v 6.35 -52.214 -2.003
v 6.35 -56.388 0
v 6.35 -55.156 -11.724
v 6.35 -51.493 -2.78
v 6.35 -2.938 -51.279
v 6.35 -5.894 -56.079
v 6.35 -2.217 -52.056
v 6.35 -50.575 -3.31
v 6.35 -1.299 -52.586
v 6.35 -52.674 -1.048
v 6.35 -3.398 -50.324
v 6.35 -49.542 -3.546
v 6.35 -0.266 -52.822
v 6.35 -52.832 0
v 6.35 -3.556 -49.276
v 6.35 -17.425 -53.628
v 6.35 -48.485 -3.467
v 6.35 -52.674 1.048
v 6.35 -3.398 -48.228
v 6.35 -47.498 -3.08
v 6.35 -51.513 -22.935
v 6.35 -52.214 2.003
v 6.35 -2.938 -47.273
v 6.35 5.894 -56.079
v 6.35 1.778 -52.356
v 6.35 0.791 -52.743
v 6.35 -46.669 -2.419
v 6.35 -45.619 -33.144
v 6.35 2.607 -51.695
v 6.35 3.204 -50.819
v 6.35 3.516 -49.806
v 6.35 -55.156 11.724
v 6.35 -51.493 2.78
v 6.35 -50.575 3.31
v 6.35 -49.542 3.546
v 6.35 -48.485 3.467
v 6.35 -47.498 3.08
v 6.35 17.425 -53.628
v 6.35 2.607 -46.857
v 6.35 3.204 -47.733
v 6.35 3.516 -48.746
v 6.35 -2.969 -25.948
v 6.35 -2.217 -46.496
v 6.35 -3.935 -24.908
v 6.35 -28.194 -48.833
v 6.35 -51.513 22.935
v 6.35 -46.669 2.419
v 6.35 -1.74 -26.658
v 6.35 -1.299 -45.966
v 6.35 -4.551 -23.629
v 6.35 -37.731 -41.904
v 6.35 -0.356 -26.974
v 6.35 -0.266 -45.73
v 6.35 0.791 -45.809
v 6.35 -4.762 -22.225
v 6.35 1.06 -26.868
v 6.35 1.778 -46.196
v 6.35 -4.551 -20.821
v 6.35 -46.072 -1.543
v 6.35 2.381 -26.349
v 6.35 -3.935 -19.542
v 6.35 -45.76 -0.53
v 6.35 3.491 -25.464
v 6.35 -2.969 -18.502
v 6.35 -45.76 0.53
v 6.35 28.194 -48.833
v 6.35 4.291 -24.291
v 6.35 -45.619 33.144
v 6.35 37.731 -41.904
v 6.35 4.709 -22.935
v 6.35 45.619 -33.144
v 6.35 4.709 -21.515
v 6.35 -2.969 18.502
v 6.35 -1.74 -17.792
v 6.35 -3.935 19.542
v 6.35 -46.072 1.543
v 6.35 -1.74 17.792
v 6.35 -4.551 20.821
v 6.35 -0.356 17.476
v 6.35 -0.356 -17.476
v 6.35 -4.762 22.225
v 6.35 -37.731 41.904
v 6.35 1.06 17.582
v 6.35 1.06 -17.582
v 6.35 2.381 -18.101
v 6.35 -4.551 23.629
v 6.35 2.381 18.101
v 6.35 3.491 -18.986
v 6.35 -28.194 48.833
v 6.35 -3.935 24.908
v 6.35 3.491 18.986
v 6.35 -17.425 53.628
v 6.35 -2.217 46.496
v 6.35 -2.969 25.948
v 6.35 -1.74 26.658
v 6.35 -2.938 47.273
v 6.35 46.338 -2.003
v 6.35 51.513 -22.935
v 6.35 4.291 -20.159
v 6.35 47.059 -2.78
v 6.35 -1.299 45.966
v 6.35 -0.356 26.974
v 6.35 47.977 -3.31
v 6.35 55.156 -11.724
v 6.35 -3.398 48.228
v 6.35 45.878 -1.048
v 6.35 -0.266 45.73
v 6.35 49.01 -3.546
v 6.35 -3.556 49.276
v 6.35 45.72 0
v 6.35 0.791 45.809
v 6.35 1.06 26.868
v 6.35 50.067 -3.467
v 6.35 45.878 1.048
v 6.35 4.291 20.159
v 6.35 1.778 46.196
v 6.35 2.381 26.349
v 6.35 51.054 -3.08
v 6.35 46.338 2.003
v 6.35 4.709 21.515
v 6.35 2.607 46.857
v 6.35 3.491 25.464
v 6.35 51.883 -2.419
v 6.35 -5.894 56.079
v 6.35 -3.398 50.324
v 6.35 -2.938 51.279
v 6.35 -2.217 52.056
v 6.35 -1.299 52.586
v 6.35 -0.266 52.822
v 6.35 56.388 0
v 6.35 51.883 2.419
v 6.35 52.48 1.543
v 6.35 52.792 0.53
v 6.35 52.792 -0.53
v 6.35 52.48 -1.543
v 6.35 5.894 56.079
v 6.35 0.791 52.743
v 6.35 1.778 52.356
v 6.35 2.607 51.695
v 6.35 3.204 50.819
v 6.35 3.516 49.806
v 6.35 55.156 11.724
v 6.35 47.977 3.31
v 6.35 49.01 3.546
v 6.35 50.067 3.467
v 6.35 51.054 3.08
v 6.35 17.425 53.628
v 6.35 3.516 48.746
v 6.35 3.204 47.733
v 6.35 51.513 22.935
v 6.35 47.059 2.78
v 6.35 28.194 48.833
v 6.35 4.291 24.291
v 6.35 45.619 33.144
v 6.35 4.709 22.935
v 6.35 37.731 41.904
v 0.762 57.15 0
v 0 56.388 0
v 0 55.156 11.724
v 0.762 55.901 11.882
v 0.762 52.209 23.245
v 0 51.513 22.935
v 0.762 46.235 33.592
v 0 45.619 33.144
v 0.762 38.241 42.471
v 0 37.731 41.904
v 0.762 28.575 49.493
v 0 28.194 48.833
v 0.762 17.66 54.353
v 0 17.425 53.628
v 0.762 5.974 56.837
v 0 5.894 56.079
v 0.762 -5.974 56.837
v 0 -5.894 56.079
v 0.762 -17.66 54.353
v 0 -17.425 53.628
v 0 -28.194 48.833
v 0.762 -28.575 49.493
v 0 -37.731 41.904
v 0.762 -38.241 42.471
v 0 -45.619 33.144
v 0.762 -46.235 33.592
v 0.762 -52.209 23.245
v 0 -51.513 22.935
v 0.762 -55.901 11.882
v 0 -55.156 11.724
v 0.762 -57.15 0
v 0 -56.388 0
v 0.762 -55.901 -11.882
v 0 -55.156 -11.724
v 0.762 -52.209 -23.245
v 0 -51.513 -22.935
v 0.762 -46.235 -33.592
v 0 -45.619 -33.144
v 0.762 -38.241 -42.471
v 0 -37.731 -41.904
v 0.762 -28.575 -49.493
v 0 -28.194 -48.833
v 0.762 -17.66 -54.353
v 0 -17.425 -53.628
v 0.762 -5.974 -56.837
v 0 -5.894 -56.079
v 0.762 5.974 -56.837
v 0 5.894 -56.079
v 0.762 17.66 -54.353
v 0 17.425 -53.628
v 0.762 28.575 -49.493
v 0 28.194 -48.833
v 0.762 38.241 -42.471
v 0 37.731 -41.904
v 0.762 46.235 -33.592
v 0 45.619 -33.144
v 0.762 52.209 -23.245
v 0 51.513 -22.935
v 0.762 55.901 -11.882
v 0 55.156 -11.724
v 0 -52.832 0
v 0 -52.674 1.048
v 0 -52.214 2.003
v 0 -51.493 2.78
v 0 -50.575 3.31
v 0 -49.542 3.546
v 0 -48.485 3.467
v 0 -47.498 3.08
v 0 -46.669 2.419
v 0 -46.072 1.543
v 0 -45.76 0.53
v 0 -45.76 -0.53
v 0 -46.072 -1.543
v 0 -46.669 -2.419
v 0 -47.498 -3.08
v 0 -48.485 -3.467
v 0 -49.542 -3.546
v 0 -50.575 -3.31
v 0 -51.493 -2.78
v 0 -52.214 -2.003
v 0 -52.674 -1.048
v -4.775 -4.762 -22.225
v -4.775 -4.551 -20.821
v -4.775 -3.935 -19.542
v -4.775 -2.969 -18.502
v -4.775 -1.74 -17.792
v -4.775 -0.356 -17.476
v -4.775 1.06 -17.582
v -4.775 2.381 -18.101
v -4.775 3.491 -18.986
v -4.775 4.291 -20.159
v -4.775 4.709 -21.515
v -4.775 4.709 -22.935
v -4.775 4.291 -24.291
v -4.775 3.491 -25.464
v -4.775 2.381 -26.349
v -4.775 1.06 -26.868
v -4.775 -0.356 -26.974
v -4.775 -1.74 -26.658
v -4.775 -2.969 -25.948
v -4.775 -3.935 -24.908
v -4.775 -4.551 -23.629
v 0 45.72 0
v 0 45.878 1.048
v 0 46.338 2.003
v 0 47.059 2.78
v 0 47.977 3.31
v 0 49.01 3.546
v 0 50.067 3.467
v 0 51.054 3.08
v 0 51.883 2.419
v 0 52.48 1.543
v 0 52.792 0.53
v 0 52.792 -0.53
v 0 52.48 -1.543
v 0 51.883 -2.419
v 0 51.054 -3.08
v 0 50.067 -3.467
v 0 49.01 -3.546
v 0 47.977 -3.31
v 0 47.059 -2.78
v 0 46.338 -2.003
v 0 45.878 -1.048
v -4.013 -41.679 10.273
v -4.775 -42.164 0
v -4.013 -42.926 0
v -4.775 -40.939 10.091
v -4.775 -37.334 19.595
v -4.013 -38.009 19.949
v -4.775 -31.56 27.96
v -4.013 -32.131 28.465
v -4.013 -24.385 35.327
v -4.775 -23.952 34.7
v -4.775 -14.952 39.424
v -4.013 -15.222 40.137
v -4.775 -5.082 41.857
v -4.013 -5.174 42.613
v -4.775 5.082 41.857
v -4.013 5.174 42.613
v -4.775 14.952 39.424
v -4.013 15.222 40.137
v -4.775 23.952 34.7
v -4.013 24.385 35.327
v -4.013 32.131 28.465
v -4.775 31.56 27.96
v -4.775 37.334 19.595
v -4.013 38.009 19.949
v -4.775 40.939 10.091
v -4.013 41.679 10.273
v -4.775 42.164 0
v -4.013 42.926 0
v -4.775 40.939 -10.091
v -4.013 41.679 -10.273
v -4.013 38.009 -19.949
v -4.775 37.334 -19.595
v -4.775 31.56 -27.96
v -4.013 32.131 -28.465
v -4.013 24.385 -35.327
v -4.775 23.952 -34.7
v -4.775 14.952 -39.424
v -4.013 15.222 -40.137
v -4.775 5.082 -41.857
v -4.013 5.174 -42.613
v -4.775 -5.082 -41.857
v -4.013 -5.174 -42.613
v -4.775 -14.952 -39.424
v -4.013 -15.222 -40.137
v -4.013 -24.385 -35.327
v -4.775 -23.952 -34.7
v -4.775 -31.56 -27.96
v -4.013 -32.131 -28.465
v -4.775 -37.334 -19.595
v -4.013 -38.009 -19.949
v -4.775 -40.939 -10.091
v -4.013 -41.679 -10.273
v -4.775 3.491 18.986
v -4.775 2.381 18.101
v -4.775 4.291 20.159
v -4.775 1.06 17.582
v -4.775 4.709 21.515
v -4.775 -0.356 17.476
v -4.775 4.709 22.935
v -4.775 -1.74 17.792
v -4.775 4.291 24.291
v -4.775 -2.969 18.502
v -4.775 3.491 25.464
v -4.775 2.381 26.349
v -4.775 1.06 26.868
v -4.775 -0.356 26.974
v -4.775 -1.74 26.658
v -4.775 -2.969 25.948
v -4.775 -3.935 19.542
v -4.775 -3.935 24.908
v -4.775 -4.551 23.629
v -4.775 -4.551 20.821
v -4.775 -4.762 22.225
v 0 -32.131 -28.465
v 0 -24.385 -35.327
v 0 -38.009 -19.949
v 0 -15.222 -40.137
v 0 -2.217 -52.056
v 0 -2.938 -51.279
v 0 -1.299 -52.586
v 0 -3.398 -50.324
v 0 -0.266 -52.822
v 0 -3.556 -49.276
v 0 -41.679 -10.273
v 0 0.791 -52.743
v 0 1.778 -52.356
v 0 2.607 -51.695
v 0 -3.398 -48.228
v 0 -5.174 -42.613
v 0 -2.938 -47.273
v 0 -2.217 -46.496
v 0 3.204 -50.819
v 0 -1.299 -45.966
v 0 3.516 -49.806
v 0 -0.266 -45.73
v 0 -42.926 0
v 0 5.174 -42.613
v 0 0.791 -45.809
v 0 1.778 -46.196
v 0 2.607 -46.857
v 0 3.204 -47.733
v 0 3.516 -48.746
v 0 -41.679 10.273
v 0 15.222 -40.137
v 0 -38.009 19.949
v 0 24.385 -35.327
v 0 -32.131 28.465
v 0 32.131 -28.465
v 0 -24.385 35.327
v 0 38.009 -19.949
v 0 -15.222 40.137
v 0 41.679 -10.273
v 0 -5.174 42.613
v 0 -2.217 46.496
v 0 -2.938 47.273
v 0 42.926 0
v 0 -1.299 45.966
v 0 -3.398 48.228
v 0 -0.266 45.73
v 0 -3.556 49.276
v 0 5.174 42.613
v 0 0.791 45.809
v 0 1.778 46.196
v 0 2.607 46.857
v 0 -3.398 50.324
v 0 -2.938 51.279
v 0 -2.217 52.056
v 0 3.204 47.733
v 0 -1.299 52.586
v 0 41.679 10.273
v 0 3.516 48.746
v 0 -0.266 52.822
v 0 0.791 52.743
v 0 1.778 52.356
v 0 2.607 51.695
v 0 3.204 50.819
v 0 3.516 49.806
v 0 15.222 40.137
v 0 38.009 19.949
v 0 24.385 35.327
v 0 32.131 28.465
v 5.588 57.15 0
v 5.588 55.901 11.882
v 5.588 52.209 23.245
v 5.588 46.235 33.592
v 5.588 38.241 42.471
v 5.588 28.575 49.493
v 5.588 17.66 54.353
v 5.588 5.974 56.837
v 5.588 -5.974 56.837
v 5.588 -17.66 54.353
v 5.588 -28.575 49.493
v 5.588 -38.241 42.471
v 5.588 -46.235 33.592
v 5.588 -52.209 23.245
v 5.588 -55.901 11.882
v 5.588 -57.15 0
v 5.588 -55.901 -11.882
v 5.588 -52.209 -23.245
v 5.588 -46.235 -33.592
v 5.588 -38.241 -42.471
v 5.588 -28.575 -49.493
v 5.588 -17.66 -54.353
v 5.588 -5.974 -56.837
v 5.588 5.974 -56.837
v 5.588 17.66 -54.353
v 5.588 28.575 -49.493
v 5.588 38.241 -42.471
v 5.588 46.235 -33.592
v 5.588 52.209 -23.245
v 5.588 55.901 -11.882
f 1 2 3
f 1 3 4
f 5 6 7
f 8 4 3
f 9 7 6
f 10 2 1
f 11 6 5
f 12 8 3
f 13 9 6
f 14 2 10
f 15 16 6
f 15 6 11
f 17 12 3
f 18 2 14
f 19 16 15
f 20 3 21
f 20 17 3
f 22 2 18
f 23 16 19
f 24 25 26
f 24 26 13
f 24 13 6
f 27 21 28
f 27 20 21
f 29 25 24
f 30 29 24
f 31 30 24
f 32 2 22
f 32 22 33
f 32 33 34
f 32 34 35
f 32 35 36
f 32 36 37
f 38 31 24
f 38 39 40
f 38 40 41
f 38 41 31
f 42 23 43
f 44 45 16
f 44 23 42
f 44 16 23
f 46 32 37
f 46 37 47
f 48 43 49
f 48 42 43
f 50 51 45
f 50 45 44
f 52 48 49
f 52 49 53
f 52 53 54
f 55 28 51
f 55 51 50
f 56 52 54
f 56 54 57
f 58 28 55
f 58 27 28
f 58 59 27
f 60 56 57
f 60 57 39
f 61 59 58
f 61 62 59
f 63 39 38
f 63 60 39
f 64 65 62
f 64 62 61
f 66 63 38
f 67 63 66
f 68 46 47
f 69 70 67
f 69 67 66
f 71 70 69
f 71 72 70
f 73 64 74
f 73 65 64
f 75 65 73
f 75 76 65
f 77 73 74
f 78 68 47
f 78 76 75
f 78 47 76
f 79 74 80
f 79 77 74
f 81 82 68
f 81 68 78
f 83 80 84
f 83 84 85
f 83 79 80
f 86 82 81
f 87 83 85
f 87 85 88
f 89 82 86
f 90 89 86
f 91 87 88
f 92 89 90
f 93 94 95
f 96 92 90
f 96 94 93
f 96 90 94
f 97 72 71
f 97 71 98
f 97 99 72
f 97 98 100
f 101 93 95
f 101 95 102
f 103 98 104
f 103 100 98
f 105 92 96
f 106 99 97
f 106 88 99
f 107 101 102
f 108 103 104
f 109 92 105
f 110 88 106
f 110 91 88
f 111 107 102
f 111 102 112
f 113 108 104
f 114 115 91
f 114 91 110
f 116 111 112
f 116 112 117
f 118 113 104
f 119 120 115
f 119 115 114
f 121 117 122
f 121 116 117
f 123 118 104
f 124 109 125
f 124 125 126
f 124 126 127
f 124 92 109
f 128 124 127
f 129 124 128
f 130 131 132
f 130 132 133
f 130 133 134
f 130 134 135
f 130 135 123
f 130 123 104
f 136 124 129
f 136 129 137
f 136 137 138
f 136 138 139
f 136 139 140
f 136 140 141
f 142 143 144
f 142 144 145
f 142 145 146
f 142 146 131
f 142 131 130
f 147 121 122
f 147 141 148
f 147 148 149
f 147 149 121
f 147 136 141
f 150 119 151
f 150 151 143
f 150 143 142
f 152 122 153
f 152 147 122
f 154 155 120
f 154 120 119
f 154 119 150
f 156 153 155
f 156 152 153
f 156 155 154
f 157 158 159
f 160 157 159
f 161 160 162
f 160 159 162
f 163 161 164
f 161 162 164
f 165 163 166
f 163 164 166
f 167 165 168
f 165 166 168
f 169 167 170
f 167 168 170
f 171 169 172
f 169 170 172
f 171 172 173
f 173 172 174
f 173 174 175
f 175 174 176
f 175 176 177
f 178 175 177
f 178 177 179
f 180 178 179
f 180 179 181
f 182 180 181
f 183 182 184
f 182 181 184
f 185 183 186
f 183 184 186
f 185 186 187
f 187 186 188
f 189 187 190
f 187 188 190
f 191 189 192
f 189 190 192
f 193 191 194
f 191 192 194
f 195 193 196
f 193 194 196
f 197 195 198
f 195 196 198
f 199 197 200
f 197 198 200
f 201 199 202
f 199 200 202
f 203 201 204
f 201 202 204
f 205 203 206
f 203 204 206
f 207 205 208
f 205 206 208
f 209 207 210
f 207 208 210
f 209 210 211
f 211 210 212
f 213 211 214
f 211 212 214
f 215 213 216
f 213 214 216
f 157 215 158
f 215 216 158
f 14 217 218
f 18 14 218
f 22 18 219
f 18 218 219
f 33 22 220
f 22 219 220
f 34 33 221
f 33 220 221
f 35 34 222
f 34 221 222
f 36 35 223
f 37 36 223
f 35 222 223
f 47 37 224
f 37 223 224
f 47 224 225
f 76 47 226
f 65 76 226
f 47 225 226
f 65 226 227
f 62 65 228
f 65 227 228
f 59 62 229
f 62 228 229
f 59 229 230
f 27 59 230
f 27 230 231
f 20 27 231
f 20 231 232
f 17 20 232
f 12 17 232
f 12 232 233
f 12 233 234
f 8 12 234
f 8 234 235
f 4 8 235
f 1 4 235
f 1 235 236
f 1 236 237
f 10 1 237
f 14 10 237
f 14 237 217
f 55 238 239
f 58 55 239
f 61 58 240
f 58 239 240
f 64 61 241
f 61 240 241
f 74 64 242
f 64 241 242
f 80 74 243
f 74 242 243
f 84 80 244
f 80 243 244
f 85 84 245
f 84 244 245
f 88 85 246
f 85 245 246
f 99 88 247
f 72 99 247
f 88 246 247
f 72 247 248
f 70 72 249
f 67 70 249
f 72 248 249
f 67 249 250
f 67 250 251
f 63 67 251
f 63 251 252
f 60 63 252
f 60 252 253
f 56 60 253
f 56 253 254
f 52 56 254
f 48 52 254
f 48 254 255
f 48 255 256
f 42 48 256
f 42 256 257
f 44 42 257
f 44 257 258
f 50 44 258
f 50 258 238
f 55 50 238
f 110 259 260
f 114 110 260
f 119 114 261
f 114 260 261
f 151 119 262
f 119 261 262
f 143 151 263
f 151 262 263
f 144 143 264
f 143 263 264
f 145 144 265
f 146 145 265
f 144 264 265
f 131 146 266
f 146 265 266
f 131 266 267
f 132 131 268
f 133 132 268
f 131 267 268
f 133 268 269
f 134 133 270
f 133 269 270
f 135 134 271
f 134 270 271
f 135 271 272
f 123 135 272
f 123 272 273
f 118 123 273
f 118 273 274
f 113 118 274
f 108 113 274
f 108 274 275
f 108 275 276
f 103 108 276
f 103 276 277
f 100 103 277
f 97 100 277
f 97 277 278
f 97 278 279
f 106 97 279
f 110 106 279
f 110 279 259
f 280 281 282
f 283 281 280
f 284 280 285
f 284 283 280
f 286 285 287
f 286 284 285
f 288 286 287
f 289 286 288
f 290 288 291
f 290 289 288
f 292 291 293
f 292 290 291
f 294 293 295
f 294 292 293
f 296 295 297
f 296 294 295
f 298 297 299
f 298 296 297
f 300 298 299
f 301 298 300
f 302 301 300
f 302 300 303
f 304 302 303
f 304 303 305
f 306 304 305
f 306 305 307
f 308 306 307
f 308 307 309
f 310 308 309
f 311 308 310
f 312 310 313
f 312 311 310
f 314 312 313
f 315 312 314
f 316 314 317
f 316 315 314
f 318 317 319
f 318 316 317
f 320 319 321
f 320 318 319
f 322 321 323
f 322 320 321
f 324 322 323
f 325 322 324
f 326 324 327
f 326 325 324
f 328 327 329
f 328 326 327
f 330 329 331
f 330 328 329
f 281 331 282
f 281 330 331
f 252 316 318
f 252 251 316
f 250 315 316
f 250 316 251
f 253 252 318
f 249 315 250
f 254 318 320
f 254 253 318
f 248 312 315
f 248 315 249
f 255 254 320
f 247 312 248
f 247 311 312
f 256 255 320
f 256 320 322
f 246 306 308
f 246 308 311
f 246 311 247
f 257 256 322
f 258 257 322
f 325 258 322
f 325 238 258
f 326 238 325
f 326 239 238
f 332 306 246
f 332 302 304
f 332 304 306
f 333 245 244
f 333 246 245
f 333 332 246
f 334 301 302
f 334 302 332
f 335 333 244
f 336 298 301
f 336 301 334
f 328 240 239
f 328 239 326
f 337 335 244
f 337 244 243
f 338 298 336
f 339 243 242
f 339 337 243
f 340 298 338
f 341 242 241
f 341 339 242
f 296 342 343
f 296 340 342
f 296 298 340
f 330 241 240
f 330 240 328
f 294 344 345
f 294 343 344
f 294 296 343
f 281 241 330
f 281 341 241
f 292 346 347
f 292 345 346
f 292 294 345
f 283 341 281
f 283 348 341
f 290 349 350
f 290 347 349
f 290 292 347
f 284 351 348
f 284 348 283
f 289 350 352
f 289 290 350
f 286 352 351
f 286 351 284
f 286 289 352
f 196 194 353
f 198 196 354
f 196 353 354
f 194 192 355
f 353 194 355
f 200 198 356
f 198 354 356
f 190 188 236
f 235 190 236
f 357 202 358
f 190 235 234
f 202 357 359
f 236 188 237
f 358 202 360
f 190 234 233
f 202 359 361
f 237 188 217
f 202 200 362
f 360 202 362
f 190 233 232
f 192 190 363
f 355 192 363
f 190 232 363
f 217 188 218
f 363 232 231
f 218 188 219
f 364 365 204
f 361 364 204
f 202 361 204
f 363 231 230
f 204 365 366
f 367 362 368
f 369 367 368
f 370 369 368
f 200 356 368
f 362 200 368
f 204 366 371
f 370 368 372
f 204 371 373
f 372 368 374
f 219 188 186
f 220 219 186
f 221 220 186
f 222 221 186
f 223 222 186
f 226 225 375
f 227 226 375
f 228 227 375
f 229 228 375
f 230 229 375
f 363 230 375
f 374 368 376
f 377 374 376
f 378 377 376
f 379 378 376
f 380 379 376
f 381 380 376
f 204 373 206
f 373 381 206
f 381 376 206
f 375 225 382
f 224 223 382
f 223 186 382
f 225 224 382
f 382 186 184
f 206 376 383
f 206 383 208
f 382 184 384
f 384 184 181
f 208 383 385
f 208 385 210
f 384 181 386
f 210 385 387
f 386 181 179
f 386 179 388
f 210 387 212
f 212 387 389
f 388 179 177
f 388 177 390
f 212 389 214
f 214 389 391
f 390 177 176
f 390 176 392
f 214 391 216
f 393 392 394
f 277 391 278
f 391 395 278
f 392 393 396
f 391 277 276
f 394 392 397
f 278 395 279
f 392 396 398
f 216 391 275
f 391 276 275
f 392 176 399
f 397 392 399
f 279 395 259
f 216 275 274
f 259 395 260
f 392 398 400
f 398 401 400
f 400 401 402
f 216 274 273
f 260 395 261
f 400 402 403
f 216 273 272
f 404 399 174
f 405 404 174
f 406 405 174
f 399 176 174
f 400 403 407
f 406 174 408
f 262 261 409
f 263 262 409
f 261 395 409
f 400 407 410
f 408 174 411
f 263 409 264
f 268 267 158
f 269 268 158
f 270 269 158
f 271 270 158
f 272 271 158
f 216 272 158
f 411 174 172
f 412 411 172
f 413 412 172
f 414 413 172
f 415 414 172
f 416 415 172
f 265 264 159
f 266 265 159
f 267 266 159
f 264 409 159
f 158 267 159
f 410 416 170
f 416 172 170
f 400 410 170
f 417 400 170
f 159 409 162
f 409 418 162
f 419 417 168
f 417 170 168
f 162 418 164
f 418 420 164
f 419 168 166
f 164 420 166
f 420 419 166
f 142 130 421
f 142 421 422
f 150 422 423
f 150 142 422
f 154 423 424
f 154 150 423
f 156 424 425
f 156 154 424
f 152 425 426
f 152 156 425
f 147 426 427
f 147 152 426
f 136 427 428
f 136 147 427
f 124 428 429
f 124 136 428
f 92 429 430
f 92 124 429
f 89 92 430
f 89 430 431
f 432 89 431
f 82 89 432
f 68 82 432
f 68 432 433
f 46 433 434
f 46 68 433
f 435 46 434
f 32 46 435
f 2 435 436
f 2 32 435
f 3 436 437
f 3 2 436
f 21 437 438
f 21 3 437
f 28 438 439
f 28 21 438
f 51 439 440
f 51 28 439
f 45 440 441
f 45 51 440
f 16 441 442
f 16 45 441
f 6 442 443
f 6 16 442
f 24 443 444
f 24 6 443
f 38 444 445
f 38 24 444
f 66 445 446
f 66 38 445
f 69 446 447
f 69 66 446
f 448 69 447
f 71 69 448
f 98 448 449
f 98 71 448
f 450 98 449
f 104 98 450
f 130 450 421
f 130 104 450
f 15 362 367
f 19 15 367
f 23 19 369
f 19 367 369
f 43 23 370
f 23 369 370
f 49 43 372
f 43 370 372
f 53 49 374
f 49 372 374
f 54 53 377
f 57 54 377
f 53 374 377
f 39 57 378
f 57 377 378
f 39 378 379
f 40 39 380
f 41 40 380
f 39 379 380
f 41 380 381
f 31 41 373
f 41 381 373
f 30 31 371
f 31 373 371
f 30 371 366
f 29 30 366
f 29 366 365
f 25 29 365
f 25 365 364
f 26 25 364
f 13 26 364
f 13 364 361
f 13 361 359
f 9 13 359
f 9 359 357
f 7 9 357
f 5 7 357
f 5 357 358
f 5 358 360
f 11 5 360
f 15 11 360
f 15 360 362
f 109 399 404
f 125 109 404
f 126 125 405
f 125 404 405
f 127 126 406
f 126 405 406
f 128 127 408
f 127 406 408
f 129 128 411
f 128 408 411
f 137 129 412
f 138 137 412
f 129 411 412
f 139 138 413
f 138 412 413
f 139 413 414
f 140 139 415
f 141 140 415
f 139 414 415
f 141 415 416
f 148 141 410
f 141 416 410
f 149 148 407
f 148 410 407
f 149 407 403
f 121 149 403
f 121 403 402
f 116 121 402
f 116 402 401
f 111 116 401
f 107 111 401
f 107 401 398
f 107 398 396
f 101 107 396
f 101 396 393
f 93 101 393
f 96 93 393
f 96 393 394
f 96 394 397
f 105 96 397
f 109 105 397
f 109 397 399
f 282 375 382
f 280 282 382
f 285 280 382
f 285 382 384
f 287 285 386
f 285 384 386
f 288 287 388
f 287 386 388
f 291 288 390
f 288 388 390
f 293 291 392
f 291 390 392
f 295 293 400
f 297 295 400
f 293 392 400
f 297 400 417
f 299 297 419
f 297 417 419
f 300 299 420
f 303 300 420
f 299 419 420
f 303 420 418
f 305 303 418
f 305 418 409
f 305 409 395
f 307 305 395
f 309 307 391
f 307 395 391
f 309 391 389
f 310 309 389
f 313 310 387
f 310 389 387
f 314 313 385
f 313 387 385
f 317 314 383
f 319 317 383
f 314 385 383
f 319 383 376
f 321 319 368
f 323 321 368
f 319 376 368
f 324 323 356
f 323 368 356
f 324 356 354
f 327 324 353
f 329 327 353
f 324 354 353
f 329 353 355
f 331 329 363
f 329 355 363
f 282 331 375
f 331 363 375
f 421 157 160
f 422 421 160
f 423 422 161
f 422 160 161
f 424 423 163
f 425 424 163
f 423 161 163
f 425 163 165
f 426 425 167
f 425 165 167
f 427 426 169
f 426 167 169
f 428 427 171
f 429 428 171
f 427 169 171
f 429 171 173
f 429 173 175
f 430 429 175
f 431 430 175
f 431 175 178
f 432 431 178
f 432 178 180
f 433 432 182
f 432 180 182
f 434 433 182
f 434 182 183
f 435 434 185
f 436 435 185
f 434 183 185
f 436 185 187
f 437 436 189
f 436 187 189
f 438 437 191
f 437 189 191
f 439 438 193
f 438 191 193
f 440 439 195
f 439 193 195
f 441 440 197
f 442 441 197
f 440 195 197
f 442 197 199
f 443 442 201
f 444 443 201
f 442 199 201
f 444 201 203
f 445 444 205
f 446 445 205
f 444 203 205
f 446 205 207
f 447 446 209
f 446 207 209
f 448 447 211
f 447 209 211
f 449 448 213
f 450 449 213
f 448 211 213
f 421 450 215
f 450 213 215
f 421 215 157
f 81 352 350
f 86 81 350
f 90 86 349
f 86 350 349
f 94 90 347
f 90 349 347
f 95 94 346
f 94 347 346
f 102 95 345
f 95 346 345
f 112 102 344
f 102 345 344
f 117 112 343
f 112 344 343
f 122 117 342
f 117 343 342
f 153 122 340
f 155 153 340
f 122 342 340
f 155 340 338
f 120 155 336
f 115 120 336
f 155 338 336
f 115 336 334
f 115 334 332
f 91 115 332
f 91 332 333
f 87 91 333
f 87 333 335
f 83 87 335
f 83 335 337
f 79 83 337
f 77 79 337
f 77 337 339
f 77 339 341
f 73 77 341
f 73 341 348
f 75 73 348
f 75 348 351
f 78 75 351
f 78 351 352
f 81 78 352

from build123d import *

# Parameters (mm, degrees)
F0_R     = 57.15
F1_DEPTH = 6.35
F2_R     = 42.926
F3_DEPTH = 4.7752
F4_SIZE  = 0.762
F6_D     = 7.112
F8_D     = 9.525


with BuildPart() as f1:
    # F0 (on Right) → F1 (new body)
    with BuildSketch(Plane.YZ):
        Circle(F0_R)
    extrude(amount=F1_DEPTH)

    # F2 (on face) → F3 (join)
    with BuildSketch(Plane(origin=(0, 0, 0), x_dir=(0, -1, 0), z_dir=(-1, 0, 0))):
        Circle(F2_R)
    extrude(amount=F3_DEPTH)

    # F4
    f4_edges = [f1.edges().sort_by_distance(p)[0] for p in [
        (6.35, -57.15, 0),
        (0, -57.15, 0),
        (-4.7752, 42.926, 0),
    ]]
    chamfer(f4_edges, length=F4_SIZE)

    # F6 (through all)
    with Locations(Plane.YZ.offset(6.35)):
        with Locations((0, 49.276), (49.276, 0), (0, -49.276), (-49.276, 0)):
            Hole(F6_D / 2)

    # F8 (through all)
    with Locations(Plane.YZ.offset(6.35)):
        with Locations((0, 22.225), (0, -22.225)):
            Hole(F8_D / 2)


solid = f1.part
